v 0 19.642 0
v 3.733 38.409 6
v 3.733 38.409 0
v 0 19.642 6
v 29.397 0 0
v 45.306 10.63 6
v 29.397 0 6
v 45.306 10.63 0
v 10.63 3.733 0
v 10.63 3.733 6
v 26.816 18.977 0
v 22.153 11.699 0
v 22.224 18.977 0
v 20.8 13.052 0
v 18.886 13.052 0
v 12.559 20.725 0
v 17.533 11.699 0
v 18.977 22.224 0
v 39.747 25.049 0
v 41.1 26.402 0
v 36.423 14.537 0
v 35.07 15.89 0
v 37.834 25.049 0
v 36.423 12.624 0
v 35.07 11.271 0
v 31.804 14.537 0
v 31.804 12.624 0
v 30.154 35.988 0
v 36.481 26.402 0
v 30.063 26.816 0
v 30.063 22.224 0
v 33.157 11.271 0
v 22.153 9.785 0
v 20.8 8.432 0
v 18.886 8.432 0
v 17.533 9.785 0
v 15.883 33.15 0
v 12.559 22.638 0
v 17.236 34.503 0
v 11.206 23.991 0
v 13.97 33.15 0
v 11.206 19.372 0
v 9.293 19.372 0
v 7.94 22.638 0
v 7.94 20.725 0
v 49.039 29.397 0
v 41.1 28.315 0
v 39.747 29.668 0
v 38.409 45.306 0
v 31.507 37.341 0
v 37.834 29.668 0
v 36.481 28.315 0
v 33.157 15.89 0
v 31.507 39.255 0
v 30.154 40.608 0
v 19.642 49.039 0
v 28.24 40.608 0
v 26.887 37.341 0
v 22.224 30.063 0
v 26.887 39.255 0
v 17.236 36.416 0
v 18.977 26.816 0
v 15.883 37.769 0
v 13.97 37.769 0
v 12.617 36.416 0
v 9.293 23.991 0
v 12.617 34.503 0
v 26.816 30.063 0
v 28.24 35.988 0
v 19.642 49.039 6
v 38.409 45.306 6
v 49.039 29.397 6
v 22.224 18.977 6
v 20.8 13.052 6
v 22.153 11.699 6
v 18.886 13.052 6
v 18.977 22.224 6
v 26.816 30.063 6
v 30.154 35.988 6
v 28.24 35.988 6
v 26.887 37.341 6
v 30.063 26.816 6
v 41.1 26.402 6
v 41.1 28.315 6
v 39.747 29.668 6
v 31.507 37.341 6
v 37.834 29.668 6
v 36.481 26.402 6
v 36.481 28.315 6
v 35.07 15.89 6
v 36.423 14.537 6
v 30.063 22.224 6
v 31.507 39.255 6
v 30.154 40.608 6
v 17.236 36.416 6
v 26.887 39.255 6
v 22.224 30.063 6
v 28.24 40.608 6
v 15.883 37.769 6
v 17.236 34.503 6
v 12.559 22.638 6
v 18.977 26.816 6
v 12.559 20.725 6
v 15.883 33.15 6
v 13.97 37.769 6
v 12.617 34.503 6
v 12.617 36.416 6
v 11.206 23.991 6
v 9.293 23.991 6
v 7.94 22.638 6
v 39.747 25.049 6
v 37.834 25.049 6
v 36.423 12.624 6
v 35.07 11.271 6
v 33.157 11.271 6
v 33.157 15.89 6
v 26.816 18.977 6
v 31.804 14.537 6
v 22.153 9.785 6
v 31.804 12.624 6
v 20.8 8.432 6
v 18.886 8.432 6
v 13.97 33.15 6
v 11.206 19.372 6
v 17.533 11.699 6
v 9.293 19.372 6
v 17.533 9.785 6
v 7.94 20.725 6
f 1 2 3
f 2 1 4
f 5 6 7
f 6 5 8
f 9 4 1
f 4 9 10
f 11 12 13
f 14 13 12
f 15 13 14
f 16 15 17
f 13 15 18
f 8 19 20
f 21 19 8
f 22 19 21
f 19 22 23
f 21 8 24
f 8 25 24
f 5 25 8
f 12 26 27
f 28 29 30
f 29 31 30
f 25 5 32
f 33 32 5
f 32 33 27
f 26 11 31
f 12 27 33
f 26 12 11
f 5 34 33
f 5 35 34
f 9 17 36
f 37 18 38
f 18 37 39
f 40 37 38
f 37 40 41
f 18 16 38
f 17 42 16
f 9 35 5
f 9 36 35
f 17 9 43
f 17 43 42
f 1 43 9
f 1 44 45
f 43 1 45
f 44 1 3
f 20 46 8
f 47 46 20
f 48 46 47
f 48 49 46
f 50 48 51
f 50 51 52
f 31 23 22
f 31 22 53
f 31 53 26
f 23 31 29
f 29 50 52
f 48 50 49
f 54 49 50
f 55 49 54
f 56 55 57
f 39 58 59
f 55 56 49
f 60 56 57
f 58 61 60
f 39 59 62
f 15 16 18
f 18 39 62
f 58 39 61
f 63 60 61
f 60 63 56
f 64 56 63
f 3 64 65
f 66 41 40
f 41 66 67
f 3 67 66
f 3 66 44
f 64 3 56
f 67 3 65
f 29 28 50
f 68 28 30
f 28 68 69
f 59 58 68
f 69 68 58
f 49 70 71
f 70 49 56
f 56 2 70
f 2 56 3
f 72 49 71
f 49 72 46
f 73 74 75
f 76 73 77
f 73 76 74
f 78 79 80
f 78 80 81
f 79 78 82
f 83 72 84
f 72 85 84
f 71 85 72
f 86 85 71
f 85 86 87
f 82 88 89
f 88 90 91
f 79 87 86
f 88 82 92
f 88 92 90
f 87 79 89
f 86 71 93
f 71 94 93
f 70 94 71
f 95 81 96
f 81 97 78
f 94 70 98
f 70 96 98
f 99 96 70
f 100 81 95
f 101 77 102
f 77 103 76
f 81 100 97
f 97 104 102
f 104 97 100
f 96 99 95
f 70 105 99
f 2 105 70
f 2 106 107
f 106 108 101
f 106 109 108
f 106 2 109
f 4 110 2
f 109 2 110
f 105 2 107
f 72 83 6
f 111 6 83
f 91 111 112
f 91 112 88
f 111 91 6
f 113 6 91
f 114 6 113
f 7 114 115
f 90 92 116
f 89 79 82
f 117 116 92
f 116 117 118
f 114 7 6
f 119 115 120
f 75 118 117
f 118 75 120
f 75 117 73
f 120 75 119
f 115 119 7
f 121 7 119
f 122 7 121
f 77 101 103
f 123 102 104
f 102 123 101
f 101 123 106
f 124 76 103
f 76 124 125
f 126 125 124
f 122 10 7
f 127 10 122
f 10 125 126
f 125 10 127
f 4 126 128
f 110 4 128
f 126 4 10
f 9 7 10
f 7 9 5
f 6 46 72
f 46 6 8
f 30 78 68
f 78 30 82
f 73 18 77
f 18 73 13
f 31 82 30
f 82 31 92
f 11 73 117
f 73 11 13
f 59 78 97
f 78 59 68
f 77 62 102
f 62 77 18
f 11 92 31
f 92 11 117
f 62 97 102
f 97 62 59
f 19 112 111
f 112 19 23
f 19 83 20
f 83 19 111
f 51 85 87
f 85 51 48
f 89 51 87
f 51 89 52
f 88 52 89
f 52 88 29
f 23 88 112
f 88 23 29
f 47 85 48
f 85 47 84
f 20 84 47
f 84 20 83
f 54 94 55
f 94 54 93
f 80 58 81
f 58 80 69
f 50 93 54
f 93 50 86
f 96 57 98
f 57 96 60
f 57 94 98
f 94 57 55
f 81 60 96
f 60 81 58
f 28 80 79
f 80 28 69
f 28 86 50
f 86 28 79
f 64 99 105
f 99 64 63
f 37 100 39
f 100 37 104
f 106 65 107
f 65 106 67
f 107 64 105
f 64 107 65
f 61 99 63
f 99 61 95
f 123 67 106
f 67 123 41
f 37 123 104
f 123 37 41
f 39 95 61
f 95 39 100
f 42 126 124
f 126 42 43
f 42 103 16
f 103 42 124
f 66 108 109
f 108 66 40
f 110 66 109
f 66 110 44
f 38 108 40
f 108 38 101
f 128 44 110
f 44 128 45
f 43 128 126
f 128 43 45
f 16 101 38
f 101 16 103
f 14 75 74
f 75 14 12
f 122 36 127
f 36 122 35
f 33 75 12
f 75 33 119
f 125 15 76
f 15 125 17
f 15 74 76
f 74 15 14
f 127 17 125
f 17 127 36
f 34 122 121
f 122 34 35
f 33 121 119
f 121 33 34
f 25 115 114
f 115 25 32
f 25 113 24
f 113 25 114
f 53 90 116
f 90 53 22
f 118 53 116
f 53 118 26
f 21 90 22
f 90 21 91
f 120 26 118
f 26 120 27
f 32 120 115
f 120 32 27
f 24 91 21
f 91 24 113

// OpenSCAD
$fn = 32;

// ----------------------------------------------------------------------
// Polygon plate: 8-gon R25, 6 bolt windows
// ----------------------------------------------------------------------

// --- parameters (mm) ---
sides = 8;                // number of polygon sides
plate_r = 25;             // circumscribed radius of the polygon
bore_r = 6;               // centre bore radius
bolts = 6;                // number of bolt windows
ring_r = 14.55;           // bolt-circle radius
bolt_r = 2.5;             // bolt window radius
plate_t = 6;              // plate thickness, Z (extrusion height)

plate_d = 2 * plate_r;  // circumscribed diameter
bore_d = 2 * bore_r;  // centre bore diameter
bolt_d = 2 * bolt_r;  // bolt window diameter
ring_d = 2 * ring_r;  // bolt-circle diameter

profile = [[49.039, 29.397], [38.409, 45.306], [19.642, 49.039], [3.733, 38.409], [0, 19.642], [10.63, 3.733], [29.397, 0], [45.306, 10.63]];  // primary outline, 8 points, counter clockwise
void_1 = [[30.063, 26.816], [26.816, 30.063], [22.224, 30.063], [18.977, 26.816], [18.977, 22.224], [22.224, 18.977], [26.816, 18.977], [30.063, 22.224]];  // centre bore, 8 points
void_2 = [[41.1, 28.315], [39.747, 29.668], [37.834, 29.668], [36.481, 28.315], [36.481, 26.402], [37.834, 25.049], [39.747, 25.049], [41.1, 26.402]];  // bolt window 1, 8 points
void_3 = [[31.507, 39.255], [30.154, 40.608], [28.24, 40.608], [26.887, 39.255], [26.887, 37.341], [28.24, 35.988], [30.154, 35.988], [31.507, 37.341]];  // bolt window 2, 8 points
void_4 = [[17.236, 36.416], [15.883, 37.769], [13.97, 37.769], [12.617, 36.416], [12.617, 34.503], [13.97, 33.15], [15.883, 33.15], [17.236, 34.503]];  // bolt window 3, 8 points
void_5 = [[12.559, 22.638], [11.206, 23.991], [9.293, 23.991], [7.94, 22.638], [7.94, 20.725], [9.293, 19.372], [11.206, 19.372], [12.559, 20.725]];  // bolt window 4, 8 points
void_6 = [[22.153, 11.699], [20.8, 13.052], [18.886, 13.052], [17.533, 11.699], [17.533, 9.785], [18.886, 8.432], [20.8, 8.432], [22.153, 9.785]];  // bolt window 5, 8 points
void_7 = [[36.423, 14.537], [35.07, 15.89], [33.157, 15.89], [31.804, 14.537], [31.804, 12.624], [33.157, 11.271], [35.07, 11.271], [36.423, 12.624]];  // bolt window 6, 8 points

// --- the one profile operation ---
difference() {
  linear_extrude(height = plate_t) polygon(points = profile);
  translate([0, 0, -1])
    linear_extrude(height = plate_t + 2) polygon(points = void_1);
  translate([0, 0, -1])
    linear_extrude(height = plate_t + 2) polygon(points = void_2);
  translate([0, 0, -1])
    linear_extrude(height = plate_t + 2) polygon(points = void_3);
  translate([0, 0, -1])
    linear_extrude(height = plate_t + 2) polygon(points = void_4);
  translate([0, 0, -1])
    linear_extrude(height = plate_t + 2) polygon(points = void_5);
  translate([0, 0, -1])
    linear_extrude(height = plate_t + 2) polygon(points = void_6);
  translate([0, 0, -1])
    linear_extrude(height = plate_t + 2) polygon(points = void_7);
}
